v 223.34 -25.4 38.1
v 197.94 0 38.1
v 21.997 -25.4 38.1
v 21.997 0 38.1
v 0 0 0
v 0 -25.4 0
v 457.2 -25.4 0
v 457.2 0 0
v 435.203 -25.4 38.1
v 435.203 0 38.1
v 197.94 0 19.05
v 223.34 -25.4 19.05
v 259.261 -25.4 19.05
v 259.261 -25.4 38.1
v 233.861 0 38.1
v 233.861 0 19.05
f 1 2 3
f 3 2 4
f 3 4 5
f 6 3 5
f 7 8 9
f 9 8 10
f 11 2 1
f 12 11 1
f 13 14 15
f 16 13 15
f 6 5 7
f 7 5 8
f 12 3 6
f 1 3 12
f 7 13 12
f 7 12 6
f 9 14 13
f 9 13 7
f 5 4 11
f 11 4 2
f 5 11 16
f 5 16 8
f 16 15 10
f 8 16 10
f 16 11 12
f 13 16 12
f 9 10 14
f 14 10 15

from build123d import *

# Parameters (mm, degrees)
F1_DEPTH = 25.4
F3_DEPTH = 19.05


with BuildPart() as f1:
    # F0 (on Front) → F1 (new body)
    with BuildSketch(Plane.XZ):
        Polygon((21.997045, 38.1), (0, 0), (457.2, 0), (435.202955, 38.1), align=None)
    extrude(amount=F1_DEPTH)

    # F2 (on face) → F3 (cut)
    with BuildSketch(Plane.XY.offset(38.1)):
        Polygon((233.861157, 0), (197.940133, 0), (223.340133, -25.4), (259.261157, -25.4), align=None)
    extrude(amount=-F3_DEPTH, mode=Mode.SUBTRACT)


solid = f1.part
